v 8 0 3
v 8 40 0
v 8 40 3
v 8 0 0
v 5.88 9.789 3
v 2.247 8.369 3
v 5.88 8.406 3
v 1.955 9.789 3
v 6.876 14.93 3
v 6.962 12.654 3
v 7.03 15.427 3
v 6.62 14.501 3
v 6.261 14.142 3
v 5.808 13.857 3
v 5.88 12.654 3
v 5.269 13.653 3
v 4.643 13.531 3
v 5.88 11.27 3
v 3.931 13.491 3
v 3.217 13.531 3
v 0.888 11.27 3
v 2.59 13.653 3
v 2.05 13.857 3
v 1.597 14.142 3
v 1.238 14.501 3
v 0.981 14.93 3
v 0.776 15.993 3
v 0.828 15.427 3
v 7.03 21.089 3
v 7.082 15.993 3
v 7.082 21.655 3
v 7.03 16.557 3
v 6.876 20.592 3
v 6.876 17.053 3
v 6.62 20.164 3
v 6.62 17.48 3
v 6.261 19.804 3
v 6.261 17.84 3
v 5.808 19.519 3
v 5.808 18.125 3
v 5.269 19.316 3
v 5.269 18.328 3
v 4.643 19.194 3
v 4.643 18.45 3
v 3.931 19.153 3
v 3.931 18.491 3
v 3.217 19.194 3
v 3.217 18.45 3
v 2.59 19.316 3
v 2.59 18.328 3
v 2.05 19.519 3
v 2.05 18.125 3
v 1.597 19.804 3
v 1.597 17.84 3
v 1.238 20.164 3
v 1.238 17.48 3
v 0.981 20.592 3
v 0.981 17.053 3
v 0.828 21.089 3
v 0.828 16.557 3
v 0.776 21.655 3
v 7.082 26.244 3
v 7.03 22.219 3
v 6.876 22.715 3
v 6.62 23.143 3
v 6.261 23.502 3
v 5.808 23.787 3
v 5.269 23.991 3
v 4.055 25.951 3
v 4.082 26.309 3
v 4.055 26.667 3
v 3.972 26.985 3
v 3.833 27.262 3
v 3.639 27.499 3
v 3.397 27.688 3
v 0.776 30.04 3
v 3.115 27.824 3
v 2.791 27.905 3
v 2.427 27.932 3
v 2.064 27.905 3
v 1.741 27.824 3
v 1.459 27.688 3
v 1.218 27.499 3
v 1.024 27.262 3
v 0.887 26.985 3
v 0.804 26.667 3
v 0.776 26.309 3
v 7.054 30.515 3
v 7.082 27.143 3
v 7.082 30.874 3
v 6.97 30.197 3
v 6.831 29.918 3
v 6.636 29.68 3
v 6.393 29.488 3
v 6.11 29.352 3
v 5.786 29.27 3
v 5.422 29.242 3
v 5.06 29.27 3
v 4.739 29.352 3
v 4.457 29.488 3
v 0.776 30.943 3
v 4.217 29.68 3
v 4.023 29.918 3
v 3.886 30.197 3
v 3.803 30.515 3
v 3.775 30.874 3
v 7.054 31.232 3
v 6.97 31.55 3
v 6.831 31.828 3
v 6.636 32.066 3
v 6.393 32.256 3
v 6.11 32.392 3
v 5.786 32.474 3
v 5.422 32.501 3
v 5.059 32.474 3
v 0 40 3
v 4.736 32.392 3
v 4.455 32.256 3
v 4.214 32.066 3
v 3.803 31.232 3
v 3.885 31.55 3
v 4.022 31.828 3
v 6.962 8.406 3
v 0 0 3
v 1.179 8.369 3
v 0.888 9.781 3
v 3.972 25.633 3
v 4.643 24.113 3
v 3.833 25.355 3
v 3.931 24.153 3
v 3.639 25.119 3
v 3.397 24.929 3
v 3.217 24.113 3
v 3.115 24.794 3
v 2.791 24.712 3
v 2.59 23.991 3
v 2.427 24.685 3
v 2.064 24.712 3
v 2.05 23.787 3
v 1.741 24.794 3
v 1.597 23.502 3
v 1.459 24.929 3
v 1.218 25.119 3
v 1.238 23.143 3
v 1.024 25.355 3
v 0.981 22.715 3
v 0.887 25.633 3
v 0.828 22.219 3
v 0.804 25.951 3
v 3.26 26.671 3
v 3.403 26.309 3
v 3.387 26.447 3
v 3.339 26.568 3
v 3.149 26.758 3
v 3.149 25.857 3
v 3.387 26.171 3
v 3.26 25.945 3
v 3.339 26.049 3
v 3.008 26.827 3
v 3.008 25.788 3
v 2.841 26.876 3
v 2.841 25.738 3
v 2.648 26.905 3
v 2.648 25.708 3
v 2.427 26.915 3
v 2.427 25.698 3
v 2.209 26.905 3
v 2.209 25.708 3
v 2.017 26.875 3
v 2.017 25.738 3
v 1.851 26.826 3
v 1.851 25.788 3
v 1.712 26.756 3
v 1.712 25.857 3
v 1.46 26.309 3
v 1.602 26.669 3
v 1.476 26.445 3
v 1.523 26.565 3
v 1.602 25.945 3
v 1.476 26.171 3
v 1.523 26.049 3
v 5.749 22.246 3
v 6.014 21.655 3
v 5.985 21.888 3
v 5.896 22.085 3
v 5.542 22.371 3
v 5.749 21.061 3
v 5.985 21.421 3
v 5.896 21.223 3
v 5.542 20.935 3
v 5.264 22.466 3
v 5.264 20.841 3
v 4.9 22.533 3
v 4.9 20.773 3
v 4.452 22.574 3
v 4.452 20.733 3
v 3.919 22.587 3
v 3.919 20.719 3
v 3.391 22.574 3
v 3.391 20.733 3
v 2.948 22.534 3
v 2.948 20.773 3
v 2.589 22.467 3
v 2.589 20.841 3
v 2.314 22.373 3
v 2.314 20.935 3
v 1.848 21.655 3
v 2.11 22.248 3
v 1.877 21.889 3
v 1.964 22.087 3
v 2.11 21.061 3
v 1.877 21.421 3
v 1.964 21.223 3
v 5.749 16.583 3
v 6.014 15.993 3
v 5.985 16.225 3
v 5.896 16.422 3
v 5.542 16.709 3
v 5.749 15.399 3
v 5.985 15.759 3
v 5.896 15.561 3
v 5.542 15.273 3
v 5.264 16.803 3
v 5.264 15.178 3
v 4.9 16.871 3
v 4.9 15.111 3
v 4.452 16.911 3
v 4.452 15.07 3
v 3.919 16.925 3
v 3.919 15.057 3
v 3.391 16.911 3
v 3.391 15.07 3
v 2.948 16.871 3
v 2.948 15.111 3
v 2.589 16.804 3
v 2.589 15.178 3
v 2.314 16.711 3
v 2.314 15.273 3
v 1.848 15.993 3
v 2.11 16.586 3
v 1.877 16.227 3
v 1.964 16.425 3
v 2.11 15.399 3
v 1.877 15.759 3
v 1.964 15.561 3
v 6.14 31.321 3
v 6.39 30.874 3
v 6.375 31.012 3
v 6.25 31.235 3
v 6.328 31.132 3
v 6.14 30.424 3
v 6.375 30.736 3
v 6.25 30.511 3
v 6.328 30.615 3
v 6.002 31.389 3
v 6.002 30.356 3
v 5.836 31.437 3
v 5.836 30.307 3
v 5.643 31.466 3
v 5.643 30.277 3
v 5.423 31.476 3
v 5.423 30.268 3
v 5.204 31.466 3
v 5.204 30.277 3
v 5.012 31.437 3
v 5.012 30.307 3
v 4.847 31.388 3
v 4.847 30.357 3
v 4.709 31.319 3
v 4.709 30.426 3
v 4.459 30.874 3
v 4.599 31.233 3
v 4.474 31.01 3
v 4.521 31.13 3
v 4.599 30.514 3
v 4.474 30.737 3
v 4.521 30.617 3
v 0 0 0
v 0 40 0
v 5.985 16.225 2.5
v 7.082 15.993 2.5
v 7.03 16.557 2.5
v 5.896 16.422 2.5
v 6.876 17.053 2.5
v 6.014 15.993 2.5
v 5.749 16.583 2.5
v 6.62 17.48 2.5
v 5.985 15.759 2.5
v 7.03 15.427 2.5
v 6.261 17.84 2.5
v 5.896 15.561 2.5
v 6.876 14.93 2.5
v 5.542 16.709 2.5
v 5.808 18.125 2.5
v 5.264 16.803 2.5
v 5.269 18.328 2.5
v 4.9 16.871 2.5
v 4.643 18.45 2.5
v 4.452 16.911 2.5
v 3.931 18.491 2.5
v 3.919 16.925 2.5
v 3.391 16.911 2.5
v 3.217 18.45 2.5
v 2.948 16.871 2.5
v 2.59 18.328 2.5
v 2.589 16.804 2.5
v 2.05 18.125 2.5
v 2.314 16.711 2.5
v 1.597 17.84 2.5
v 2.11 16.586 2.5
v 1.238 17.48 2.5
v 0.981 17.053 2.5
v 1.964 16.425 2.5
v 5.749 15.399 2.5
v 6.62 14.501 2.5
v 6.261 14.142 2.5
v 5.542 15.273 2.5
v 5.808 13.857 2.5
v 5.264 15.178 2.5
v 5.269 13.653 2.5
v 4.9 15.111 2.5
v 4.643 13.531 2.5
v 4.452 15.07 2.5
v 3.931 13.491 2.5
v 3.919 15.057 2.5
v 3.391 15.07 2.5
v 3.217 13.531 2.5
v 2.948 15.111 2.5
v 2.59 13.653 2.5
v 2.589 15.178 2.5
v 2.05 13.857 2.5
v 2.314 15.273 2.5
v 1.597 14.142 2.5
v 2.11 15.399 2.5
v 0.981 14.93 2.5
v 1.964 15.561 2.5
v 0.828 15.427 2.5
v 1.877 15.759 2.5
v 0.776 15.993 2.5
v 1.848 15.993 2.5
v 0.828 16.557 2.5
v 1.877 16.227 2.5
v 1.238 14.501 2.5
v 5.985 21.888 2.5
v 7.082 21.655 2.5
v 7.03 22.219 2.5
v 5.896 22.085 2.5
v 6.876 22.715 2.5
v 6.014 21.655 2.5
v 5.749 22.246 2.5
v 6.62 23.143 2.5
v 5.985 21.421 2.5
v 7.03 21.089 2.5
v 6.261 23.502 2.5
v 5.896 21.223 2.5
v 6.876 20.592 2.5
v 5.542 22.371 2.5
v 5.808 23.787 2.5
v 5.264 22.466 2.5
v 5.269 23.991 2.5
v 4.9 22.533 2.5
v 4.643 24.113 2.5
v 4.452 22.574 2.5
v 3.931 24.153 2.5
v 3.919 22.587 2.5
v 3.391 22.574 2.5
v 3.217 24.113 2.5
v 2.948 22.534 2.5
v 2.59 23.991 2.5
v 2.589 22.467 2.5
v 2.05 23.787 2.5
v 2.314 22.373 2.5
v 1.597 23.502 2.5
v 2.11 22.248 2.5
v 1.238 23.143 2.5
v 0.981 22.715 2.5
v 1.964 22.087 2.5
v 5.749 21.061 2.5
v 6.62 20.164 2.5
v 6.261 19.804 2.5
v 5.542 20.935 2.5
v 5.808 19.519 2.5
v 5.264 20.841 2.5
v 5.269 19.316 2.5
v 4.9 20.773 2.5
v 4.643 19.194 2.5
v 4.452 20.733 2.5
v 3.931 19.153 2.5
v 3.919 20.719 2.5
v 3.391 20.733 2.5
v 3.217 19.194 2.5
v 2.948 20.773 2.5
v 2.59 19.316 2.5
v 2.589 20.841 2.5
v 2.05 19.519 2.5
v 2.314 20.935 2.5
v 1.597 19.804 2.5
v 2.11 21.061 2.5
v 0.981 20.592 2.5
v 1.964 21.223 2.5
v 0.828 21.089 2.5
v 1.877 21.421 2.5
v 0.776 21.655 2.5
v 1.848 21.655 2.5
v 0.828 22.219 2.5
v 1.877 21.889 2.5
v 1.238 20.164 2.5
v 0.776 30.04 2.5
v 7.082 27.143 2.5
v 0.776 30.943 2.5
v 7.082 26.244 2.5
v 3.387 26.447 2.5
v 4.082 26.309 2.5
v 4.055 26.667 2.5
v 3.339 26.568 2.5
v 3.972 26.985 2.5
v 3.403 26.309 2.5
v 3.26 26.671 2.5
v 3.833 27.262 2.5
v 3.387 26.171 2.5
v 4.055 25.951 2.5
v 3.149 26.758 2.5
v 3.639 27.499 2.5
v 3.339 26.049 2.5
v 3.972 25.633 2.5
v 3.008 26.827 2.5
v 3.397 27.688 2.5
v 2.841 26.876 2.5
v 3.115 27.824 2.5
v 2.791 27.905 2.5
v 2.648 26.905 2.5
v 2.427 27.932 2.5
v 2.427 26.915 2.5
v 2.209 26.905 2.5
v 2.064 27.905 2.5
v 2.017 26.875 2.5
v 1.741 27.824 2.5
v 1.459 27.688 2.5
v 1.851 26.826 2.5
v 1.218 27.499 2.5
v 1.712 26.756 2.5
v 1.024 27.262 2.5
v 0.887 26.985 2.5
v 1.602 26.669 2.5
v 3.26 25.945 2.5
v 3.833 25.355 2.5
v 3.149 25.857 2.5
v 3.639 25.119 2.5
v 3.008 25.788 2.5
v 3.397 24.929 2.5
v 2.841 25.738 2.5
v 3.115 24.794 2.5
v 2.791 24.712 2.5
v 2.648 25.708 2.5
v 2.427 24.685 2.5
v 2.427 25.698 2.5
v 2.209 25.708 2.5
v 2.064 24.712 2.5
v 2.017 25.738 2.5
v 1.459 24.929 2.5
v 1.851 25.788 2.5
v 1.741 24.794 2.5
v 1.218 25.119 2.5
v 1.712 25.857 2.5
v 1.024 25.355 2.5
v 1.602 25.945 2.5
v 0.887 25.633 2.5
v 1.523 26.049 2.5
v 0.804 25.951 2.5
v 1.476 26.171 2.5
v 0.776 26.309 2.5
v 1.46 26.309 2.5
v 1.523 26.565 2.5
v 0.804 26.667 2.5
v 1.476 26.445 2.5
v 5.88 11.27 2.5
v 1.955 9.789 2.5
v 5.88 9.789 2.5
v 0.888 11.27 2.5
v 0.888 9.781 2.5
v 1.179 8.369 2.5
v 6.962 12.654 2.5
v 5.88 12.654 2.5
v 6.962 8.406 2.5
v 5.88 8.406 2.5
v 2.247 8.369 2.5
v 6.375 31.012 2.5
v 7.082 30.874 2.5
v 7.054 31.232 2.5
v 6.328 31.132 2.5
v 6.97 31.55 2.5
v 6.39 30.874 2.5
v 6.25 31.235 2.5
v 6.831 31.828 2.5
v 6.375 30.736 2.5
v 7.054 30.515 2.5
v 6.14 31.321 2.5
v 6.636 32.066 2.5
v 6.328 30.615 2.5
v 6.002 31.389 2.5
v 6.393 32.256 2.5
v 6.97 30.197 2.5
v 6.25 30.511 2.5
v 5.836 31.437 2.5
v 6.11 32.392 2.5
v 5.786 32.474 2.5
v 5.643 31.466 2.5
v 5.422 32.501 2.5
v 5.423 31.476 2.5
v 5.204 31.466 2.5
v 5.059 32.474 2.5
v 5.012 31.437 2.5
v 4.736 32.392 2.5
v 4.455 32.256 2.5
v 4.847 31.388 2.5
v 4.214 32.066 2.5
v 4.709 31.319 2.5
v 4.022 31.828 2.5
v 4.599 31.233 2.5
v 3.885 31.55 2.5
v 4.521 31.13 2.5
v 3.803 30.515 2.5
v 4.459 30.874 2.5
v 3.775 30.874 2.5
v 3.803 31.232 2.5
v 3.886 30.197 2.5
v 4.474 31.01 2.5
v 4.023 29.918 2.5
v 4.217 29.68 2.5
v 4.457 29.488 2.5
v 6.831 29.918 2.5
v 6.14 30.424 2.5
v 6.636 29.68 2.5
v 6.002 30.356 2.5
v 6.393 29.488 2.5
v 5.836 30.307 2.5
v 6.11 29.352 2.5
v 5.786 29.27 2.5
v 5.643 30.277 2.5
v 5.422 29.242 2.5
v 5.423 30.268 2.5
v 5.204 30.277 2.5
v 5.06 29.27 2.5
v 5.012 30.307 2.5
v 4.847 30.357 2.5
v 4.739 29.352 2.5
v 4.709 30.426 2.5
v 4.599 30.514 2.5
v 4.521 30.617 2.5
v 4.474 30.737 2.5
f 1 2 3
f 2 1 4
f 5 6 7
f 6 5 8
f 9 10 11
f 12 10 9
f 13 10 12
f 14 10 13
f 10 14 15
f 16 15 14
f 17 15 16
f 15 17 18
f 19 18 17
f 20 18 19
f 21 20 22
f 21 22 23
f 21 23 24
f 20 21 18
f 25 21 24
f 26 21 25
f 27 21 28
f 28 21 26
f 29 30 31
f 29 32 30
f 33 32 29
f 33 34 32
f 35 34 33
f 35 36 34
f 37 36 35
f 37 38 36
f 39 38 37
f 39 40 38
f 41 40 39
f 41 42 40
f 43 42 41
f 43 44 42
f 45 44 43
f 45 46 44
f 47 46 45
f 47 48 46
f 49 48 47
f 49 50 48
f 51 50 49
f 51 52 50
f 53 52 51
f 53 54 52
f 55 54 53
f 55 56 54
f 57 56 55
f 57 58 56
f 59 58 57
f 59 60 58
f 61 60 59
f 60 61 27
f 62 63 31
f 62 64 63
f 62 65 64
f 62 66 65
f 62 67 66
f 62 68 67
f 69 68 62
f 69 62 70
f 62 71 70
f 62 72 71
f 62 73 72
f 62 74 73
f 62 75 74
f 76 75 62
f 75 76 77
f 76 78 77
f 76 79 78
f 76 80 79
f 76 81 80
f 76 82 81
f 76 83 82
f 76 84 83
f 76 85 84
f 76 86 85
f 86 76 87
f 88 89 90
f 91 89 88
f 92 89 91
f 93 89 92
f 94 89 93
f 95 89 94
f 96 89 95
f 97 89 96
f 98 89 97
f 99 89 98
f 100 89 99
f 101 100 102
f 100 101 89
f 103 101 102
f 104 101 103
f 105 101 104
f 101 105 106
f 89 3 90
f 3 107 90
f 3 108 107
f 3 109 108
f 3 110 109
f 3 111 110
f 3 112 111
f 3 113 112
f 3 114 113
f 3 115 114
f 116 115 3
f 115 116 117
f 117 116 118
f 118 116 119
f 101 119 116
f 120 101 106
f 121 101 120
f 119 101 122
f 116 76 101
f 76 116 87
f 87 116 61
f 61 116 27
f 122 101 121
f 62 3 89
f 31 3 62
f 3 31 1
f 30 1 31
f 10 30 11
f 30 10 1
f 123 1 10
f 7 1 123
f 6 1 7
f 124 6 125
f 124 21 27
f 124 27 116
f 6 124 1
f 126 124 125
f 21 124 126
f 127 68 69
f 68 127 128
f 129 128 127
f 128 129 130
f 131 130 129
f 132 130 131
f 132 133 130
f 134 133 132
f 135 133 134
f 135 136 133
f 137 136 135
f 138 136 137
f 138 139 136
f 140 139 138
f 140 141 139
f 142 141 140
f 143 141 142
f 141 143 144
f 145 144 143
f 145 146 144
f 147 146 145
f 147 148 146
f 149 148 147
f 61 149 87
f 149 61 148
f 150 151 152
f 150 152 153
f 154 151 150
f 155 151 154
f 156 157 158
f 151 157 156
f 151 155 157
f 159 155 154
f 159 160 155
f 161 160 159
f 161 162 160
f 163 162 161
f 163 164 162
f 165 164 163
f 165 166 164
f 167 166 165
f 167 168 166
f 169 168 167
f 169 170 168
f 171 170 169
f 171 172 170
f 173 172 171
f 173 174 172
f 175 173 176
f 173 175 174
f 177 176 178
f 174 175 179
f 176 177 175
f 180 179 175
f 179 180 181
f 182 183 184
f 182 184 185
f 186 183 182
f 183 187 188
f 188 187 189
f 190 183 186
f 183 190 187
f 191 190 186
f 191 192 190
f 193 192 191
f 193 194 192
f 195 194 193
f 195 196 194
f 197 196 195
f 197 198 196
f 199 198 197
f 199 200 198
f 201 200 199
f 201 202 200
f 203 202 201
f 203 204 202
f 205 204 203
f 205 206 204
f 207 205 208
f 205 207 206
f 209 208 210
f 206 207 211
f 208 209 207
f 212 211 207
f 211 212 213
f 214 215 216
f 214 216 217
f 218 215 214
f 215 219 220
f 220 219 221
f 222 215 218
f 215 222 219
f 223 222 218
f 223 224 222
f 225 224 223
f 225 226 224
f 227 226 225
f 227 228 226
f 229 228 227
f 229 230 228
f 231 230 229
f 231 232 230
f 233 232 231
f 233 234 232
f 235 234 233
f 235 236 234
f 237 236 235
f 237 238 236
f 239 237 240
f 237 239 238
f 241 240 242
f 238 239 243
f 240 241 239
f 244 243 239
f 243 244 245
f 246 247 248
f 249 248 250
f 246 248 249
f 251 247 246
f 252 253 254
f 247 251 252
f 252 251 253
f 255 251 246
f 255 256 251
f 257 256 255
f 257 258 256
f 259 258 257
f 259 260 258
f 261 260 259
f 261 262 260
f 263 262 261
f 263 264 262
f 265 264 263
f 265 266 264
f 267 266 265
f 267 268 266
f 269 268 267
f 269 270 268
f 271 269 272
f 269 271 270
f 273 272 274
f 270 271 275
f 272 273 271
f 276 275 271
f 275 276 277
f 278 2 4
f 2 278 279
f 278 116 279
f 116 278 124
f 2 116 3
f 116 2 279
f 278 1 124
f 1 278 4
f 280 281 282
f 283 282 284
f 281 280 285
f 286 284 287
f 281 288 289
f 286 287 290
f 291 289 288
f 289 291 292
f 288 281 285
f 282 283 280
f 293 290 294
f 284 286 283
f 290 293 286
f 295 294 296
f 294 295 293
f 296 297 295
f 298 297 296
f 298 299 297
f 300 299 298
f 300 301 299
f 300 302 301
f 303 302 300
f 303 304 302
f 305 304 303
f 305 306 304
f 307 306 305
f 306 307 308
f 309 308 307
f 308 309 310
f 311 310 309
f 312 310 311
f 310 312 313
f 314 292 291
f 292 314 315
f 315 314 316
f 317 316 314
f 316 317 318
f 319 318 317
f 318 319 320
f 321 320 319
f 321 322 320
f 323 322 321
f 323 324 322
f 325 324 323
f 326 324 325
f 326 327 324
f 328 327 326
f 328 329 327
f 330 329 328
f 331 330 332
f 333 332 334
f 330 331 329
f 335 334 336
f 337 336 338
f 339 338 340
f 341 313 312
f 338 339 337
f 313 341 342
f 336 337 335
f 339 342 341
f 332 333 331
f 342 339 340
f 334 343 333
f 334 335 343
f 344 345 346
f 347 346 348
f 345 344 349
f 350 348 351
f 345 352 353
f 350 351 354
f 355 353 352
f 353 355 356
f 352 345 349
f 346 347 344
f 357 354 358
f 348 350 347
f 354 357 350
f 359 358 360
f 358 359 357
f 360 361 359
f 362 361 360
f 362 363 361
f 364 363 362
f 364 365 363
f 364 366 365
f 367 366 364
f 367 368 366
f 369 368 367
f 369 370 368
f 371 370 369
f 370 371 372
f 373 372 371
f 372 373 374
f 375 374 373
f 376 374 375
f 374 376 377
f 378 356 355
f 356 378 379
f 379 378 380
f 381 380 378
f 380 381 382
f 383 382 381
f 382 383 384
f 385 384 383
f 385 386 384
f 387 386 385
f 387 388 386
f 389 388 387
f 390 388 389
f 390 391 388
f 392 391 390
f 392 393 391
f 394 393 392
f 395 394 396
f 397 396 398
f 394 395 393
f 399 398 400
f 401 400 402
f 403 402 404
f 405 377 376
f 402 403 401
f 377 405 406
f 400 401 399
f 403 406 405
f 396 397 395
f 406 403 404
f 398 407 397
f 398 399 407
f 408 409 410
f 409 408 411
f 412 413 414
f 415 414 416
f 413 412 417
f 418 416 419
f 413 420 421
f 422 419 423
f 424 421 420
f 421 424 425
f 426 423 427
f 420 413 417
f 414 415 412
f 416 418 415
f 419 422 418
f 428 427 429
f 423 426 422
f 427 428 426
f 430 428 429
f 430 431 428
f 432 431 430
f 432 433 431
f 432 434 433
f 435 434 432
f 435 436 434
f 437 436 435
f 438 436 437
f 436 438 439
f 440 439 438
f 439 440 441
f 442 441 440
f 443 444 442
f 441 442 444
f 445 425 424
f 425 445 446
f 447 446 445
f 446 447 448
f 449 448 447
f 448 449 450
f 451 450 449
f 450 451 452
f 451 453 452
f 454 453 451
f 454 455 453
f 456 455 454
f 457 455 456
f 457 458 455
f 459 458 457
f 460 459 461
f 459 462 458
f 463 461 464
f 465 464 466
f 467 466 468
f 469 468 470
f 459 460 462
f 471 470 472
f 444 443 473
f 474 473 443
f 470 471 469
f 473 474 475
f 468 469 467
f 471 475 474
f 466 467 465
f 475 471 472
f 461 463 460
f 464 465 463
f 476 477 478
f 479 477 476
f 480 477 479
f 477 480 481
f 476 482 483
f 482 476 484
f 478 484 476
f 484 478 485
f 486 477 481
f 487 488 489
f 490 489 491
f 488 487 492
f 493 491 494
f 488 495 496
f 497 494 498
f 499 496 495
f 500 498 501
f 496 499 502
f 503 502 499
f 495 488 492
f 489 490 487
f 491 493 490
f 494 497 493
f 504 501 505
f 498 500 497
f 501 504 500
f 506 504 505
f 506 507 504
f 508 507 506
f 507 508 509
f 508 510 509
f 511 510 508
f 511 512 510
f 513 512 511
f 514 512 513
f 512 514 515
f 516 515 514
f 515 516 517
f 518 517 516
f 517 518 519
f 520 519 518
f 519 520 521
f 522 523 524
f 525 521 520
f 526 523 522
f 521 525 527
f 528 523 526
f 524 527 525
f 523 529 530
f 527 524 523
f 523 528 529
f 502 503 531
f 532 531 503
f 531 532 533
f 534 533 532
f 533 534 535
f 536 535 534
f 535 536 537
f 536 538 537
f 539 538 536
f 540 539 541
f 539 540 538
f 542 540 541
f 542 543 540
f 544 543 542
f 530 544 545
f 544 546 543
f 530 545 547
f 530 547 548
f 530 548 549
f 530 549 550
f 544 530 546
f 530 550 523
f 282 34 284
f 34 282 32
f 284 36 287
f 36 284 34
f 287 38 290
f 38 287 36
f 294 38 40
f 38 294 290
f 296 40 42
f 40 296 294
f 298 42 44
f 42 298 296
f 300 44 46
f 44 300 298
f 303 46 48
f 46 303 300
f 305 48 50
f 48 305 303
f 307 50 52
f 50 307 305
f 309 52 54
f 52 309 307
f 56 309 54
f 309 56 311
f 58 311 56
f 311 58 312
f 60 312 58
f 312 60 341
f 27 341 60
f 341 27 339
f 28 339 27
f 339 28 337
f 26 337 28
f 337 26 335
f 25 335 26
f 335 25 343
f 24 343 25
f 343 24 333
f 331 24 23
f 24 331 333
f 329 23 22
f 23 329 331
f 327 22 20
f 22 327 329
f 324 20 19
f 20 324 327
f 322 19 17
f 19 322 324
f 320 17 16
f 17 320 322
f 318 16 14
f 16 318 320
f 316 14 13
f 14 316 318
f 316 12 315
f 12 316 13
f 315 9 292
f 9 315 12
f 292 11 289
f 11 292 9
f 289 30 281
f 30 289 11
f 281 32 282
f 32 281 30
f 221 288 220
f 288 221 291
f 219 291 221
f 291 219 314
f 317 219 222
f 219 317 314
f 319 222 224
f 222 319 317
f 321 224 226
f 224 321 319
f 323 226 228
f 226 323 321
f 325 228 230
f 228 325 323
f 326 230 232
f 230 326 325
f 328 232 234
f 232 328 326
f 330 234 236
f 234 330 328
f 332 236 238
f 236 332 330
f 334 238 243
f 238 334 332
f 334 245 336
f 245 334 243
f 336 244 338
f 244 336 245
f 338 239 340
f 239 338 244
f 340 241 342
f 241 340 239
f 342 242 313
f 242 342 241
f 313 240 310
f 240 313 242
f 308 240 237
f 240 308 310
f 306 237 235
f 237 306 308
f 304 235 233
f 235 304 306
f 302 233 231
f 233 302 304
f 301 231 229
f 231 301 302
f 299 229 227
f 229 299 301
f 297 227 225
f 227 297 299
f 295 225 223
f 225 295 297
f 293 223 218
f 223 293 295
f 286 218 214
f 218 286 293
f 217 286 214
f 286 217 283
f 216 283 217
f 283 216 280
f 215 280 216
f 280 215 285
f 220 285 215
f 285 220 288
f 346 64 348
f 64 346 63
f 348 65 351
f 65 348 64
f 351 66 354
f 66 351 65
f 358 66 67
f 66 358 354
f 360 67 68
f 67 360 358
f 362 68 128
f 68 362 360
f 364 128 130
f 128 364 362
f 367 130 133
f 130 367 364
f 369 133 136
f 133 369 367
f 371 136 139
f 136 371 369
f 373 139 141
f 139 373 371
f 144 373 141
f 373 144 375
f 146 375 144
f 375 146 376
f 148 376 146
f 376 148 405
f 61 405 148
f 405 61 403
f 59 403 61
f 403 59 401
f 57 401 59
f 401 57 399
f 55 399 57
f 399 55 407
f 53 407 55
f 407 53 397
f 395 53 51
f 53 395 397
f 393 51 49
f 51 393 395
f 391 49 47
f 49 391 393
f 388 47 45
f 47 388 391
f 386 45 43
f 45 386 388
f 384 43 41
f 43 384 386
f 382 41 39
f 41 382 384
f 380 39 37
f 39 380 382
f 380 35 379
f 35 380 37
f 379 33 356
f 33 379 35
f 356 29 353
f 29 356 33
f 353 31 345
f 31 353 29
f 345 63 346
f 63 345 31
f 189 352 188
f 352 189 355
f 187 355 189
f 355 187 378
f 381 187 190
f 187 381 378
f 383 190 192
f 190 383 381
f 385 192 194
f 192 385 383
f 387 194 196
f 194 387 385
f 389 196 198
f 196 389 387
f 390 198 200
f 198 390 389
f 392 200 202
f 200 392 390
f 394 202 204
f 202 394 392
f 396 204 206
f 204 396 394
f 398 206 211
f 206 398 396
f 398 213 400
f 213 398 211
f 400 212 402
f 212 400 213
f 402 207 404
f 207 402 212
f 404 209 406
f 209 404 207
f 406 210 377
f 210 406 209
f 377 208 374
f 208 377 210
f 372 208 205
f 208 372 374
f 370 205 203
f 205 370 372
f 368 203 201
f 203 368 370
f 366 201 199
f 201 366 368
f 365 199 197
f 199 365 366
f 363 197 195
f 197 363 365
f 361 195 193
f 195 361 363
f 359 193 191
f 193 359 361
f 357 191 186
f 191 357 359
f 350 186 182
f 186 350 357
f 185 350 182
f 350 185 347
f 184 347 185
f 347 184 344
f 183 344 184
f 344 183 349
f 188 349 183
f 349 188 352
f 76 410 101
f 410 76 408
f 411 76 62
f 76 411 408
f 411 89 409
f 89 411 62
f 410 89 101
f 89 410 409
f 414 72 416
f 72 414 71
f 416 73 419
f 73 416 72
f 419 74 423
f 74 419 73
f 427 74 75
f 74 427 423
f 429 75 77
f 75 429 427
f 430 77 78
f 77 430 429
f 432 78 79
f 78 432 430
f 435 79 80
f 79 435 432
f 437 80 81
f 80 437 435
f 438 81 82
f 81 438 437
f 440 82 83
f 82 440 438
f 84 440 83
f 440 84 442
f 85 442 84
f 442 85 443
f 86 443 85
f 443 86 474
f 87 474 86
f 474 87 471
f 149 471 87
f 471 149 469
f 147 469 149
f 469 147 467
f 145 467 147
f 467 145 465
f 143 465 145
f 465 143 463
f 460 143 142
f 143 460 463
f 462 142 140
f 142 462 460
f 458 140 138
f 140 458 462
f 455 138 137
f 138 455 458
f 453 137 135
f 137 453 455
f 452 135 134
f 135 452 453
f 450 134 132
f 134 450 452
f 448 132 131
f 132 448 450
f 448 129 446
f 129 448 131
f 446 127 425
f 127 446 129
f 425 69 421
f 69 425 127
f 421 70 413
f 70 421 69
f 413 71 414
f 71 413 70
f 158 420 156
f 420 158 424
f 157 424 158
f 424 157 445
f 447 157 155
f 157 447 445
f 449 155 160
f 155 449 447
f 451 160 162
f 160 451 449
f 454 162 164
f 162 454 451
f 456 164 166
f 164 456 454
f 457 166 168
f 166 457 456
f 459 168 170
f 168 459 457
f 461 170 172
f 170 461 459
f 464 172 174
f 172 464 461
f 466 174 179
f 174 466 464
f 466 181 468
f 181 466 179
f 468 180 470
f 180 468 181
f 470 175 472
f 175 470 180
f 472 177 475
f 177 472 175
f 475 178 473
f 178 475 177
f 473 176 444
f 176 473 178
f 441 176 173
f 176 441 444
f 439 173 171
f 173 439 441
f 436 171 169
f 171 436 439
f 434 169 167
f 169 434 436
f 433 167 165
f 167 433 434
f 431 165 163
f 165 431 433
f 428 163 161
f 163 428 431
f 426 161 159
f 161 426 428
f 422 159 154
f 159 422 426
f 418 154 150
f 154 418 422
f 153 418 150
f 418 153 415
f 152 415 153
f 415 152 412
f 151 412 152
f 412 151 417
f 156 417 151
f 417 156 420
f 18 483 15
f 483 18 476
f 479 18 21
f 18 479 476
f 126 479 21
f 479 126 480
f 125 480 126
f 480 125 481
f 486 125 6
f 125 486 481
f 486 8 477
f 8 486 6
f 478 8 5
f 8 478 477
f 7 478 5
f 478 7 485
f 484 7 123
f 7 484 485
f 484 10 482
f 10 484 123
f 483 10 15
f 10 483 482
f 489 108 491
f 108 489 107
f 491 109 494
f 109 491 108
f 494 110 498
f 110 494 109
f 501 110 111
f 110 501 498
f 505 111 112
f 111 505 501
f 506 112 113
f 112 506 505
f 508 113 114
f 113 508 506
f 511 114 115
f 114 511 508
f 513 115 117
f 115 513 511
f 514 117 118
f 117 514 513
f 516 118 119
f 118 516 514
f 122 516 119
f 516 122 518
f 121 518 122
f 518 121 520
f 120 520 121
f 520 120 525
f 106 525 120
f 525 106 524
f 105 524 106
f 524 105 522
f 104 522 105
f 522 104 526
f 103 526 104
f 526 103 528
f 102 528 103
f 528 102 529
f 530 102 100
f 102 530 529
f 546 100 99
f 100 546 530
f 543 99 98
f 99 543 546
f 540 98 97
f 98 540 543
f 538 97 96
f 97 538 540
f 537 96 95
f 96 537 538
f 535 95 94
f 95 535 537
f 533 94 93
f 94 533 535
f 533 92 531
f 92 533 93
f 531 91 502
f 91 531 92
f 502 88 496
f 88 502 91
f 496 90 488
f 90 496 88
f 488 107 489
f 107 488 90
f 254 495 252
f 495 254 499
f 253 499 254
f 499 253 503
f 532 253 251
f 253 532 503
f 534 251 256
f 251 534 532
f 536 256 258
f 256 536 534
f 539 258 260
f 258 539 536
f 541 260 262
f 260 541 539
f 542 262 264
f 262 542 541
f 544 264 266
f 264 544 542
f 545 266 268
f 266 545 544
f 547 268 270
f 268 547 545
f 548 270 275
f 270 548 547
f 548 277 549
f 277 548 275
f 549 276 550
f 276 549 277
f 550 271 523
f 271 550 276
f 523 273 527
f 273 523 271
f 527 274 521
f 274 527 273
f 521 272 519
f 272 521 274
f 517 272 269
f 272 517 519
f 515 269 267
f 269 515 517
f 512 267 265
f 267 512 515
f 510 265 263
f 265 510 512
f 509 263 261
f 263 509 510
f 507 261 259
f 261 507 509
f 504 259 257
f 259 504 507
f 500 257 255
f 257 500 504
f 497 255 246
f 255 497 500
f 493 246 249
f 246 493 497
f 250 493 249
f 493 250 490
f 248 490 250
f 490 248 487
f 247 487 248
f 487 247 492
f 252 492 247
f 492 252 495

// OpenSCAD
difference()
{
    cube([8,40,3]);
    rotate([0,0,90])
    {
        translate([20,-4,2.5])
        {
            linear_extrude(2)
            {
                #text(   "100%", 
                        size = 6, 
                        font = "Calibri:style=Bold",
                        halign = "center",
                        valign = "center",
                        $fn = 30);
                
            }
        }
    }
}
